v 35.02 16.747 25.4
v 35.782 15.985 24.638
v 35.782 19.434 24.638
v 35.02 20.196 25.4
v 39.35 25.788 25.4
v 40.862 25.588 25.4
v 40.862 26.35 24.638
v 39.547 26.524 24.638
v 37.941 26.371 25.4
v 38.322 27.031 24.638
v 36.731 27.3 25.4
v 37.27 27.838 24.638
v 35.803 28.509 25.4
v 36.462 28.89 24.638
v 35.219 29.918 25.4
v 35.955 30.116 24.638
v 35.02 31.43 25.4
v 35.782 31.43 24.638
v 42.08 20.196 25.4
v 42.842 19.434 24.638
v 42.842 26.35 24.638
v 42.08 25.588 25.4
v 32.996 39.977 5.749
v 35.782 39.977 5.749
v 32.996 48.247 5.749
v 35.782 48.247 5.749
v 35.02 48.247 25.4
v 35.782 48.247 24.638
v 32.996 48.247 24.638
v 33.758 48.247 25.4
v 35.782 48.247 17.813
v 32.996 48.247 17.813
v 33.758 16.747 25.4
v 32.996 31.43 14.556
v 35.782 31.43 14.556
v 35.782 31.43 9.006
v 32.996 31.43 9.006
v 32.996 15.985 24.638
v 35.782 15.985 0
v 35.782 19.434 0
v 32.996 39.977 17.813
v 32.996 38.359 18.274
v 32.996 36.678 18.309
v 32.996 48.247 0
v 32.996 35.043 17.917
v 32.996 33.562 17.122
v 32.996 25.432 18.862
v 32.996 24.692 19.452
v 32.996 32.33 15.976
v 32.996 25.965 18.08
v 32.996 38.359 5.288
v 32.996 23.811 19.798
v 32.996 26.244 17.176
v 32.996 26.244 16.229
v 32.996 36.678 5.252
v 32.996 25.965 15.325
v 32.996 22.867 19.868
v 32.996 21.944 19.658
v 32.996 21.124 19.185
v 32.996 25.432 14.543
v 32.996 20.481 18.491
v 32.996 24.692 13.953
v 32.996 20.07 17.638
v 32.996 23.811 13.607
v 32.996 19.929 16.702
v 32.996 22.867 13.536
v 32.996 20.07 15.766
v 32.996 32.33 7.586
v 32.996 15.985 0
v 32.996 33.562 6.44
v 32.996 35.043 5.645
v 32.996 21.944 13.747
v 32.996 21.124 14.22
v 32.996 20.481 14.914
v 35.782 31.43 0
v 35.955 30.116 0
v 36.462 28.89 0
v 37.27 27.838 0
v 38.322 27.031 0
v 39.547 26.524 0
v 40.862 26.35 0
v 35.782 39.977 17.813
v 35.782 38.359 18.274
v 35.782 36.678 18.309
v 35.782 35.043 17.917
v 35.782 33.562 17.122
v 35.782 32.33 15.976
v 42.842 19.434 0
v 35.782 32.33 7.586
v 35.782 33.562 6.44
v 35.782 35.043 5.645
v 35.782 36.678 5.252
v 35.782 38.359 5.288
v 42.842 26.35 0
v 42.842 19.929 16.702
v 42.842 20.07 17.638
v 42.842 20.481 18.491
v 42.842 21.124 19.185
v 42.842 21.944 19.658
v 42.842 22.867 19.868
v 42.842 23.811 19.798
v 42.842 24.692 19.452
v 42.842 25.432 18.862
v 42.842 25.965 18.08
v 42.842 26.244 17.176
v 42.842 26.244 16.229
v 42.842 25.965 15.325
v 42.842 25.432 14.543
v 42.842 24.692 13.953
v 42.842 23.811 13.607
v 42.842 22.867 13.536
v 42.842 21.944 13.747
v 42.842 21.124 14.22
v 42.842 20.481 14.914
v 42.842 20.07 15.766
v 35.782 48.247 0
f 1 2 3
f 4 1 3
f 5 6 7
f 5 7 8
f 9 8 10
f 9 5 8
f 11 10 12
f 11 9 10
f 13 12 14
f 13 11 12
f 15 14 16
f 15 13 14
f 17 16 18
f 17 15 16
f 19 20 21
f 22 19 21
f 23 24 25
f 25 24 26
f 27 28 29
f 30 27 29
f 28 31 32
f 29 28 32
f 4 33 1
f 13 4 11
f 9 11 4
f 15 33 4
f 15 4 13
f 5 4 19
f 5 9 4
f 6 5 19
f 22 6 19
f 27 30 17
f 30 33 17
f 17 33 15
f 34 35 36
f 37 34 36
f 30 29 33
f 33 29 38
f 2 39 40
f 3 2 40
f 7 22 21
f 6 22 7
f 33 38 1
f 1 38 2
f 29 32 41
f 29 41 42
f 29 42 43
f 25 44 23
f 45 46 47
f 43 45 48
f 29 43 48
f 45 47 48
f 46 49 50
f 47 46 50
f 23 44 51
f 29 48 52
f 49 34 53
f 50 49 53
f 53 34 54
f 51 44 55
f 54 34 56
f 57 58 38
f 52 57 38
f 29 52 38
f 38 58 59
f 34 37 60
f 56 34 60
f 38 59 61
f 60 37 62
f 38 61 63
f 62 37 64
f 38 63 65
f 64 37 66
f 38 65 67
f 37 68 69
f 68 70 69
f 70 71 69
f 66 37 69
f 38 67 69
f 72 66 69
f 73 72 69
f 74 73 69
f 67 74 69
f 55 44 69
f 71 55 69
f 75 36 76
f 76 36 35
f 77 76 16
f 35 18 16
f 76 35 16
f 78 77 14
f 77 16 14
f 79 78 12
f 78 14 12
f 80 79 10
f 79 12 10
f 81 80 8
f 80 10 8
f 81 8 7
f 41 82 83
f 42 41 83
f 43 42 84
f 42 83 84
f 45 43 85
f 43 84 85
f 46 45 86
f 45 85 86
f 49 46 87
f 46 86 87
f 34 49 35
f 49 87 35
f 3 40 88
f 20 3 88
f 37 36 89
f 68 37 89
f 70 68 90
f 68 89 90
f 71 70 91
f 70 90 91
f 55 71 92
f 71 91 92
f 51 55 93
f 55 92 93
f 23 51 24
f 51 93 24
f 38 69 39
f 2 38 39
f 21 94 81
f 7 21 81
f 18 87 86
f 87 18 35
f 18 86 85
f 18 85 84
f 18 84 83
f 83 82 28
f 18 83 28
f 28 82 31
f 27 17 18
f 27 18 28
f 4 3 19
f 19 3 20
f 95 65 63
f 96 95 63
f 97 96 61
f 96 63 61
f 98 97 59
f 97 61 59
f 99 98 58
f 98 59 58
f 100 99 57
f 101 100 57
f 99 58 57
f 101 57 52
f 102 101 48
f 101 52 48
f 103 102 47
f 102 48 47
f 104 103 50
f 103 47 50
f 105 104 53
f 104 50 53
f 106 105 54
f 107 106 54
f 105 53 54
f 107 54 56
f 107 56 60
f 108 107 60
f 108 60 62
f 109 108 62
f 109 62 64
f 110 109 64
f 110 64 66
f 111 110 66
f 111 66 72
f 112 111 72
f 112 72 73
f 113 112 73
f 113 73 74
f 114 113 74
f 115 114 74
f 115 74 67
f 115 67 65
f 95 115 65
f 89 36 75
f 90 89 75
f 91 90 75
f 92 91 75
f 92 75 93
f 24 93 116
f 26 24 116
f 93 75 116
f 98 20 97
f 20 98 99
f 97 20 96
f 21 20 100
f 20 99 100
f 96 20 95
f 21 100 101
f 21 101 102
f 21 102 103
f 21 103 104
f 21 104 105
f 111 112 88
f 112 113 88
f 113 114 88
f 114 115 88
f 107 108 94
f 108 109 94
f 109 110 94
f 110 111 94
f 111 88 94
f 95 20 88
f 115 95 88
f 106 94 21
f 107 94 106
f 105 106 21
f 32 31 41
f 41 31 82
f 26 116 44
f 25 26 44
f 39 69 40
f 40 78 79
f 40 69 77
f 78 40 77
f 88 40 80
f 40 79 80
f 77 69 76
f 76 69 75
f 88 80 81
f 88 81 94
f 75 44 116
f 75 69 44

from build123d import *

# Parameters (mm, degrees)
F1_DEPTH = 25.4
F2_R     = 5.08
F3_SIZE  = 0.762
F5_DEPTH = 25.4
F7_D     = 6.35


with BuildPart() as f1:
    # F0 (on Top) → F1 (new body)
    with BuildSketch(Plane.XY):
        Polygon((35.7818603516, 26.3504646719), (35.7818603516, 48.246845603), (32.9955667257, 48.246845603), (32.9955667257, 15.984505415), (35.7818603516, 15.984505415), (35.7818603516, 19.4336399436), (42.8418815136, 19.4336399436), (42.8418815136, 26.3504646719), align=None)
    extrude(amount=F1_DEPTH)

    # F2
    f2_edges = [f1.edges().sort_by_distance(p)[0] for p in [
        (35.78186, 26.350465, 12.7),
    ]]
    fillet(f2_edges, radius=F2_R)

    # F3
    f3_edges = [f1.edges().sort_by_distance(p)[0] for p in [
        (35.78186, 39.838655, 25.4),
        (42.841882, 22.892052, 25.4),
        (39.311871, 19.43364, 25.4),
        (35.78186, 17.709073, 25.4),
        (34.388714, 15.984505, 25.4),
        (32.995567, 32.115676, 25.4),
        (37.269758, 27.838362, 25.4),
        (41.851871, 26.350465, 25.4),
    ]]
    chamfer(f3_edges, length=F3_SIZE)

    # F4 (on face) → F5 (cut)
    with BuildSketch(Plane.YZ.offset(35.7818603516)):
        with BuildLine():
            Line((48.246845603, 5.7491324842), (48.246845603, 17.8127139807))
            Line((48.246845603, 17.8127139807), (39.9765420257, 17.8127139807))
            ThreePointArc((39.9765420257, 17.8127139807), (35.0432489169, 17.9167289348), (31.4304646719, 14.5557781754))
            Line((31.4304646719, 14.5557781754), (31.4304646719, 9.0060682895))
            ThreePointArc((31.4304646719, 9.0060682895), (35.0432489169, 5.6451175301), (39.9765420257, 5.7491324842))
            Line((39.9765420257, 5.7491324842), (48.246845603, 5.7491324842))
        make_face()
    extrude(amount=-F5_DEPTH, mode=Mode.SUBTRACT)

    # F7 (through all)
    with Locations(Plane.YZ.offset(42.8418815136)):
        with Locations((23.1040623039, 16.7023018003)):
            Hole(F7_D / 2)


solid = f1.part
